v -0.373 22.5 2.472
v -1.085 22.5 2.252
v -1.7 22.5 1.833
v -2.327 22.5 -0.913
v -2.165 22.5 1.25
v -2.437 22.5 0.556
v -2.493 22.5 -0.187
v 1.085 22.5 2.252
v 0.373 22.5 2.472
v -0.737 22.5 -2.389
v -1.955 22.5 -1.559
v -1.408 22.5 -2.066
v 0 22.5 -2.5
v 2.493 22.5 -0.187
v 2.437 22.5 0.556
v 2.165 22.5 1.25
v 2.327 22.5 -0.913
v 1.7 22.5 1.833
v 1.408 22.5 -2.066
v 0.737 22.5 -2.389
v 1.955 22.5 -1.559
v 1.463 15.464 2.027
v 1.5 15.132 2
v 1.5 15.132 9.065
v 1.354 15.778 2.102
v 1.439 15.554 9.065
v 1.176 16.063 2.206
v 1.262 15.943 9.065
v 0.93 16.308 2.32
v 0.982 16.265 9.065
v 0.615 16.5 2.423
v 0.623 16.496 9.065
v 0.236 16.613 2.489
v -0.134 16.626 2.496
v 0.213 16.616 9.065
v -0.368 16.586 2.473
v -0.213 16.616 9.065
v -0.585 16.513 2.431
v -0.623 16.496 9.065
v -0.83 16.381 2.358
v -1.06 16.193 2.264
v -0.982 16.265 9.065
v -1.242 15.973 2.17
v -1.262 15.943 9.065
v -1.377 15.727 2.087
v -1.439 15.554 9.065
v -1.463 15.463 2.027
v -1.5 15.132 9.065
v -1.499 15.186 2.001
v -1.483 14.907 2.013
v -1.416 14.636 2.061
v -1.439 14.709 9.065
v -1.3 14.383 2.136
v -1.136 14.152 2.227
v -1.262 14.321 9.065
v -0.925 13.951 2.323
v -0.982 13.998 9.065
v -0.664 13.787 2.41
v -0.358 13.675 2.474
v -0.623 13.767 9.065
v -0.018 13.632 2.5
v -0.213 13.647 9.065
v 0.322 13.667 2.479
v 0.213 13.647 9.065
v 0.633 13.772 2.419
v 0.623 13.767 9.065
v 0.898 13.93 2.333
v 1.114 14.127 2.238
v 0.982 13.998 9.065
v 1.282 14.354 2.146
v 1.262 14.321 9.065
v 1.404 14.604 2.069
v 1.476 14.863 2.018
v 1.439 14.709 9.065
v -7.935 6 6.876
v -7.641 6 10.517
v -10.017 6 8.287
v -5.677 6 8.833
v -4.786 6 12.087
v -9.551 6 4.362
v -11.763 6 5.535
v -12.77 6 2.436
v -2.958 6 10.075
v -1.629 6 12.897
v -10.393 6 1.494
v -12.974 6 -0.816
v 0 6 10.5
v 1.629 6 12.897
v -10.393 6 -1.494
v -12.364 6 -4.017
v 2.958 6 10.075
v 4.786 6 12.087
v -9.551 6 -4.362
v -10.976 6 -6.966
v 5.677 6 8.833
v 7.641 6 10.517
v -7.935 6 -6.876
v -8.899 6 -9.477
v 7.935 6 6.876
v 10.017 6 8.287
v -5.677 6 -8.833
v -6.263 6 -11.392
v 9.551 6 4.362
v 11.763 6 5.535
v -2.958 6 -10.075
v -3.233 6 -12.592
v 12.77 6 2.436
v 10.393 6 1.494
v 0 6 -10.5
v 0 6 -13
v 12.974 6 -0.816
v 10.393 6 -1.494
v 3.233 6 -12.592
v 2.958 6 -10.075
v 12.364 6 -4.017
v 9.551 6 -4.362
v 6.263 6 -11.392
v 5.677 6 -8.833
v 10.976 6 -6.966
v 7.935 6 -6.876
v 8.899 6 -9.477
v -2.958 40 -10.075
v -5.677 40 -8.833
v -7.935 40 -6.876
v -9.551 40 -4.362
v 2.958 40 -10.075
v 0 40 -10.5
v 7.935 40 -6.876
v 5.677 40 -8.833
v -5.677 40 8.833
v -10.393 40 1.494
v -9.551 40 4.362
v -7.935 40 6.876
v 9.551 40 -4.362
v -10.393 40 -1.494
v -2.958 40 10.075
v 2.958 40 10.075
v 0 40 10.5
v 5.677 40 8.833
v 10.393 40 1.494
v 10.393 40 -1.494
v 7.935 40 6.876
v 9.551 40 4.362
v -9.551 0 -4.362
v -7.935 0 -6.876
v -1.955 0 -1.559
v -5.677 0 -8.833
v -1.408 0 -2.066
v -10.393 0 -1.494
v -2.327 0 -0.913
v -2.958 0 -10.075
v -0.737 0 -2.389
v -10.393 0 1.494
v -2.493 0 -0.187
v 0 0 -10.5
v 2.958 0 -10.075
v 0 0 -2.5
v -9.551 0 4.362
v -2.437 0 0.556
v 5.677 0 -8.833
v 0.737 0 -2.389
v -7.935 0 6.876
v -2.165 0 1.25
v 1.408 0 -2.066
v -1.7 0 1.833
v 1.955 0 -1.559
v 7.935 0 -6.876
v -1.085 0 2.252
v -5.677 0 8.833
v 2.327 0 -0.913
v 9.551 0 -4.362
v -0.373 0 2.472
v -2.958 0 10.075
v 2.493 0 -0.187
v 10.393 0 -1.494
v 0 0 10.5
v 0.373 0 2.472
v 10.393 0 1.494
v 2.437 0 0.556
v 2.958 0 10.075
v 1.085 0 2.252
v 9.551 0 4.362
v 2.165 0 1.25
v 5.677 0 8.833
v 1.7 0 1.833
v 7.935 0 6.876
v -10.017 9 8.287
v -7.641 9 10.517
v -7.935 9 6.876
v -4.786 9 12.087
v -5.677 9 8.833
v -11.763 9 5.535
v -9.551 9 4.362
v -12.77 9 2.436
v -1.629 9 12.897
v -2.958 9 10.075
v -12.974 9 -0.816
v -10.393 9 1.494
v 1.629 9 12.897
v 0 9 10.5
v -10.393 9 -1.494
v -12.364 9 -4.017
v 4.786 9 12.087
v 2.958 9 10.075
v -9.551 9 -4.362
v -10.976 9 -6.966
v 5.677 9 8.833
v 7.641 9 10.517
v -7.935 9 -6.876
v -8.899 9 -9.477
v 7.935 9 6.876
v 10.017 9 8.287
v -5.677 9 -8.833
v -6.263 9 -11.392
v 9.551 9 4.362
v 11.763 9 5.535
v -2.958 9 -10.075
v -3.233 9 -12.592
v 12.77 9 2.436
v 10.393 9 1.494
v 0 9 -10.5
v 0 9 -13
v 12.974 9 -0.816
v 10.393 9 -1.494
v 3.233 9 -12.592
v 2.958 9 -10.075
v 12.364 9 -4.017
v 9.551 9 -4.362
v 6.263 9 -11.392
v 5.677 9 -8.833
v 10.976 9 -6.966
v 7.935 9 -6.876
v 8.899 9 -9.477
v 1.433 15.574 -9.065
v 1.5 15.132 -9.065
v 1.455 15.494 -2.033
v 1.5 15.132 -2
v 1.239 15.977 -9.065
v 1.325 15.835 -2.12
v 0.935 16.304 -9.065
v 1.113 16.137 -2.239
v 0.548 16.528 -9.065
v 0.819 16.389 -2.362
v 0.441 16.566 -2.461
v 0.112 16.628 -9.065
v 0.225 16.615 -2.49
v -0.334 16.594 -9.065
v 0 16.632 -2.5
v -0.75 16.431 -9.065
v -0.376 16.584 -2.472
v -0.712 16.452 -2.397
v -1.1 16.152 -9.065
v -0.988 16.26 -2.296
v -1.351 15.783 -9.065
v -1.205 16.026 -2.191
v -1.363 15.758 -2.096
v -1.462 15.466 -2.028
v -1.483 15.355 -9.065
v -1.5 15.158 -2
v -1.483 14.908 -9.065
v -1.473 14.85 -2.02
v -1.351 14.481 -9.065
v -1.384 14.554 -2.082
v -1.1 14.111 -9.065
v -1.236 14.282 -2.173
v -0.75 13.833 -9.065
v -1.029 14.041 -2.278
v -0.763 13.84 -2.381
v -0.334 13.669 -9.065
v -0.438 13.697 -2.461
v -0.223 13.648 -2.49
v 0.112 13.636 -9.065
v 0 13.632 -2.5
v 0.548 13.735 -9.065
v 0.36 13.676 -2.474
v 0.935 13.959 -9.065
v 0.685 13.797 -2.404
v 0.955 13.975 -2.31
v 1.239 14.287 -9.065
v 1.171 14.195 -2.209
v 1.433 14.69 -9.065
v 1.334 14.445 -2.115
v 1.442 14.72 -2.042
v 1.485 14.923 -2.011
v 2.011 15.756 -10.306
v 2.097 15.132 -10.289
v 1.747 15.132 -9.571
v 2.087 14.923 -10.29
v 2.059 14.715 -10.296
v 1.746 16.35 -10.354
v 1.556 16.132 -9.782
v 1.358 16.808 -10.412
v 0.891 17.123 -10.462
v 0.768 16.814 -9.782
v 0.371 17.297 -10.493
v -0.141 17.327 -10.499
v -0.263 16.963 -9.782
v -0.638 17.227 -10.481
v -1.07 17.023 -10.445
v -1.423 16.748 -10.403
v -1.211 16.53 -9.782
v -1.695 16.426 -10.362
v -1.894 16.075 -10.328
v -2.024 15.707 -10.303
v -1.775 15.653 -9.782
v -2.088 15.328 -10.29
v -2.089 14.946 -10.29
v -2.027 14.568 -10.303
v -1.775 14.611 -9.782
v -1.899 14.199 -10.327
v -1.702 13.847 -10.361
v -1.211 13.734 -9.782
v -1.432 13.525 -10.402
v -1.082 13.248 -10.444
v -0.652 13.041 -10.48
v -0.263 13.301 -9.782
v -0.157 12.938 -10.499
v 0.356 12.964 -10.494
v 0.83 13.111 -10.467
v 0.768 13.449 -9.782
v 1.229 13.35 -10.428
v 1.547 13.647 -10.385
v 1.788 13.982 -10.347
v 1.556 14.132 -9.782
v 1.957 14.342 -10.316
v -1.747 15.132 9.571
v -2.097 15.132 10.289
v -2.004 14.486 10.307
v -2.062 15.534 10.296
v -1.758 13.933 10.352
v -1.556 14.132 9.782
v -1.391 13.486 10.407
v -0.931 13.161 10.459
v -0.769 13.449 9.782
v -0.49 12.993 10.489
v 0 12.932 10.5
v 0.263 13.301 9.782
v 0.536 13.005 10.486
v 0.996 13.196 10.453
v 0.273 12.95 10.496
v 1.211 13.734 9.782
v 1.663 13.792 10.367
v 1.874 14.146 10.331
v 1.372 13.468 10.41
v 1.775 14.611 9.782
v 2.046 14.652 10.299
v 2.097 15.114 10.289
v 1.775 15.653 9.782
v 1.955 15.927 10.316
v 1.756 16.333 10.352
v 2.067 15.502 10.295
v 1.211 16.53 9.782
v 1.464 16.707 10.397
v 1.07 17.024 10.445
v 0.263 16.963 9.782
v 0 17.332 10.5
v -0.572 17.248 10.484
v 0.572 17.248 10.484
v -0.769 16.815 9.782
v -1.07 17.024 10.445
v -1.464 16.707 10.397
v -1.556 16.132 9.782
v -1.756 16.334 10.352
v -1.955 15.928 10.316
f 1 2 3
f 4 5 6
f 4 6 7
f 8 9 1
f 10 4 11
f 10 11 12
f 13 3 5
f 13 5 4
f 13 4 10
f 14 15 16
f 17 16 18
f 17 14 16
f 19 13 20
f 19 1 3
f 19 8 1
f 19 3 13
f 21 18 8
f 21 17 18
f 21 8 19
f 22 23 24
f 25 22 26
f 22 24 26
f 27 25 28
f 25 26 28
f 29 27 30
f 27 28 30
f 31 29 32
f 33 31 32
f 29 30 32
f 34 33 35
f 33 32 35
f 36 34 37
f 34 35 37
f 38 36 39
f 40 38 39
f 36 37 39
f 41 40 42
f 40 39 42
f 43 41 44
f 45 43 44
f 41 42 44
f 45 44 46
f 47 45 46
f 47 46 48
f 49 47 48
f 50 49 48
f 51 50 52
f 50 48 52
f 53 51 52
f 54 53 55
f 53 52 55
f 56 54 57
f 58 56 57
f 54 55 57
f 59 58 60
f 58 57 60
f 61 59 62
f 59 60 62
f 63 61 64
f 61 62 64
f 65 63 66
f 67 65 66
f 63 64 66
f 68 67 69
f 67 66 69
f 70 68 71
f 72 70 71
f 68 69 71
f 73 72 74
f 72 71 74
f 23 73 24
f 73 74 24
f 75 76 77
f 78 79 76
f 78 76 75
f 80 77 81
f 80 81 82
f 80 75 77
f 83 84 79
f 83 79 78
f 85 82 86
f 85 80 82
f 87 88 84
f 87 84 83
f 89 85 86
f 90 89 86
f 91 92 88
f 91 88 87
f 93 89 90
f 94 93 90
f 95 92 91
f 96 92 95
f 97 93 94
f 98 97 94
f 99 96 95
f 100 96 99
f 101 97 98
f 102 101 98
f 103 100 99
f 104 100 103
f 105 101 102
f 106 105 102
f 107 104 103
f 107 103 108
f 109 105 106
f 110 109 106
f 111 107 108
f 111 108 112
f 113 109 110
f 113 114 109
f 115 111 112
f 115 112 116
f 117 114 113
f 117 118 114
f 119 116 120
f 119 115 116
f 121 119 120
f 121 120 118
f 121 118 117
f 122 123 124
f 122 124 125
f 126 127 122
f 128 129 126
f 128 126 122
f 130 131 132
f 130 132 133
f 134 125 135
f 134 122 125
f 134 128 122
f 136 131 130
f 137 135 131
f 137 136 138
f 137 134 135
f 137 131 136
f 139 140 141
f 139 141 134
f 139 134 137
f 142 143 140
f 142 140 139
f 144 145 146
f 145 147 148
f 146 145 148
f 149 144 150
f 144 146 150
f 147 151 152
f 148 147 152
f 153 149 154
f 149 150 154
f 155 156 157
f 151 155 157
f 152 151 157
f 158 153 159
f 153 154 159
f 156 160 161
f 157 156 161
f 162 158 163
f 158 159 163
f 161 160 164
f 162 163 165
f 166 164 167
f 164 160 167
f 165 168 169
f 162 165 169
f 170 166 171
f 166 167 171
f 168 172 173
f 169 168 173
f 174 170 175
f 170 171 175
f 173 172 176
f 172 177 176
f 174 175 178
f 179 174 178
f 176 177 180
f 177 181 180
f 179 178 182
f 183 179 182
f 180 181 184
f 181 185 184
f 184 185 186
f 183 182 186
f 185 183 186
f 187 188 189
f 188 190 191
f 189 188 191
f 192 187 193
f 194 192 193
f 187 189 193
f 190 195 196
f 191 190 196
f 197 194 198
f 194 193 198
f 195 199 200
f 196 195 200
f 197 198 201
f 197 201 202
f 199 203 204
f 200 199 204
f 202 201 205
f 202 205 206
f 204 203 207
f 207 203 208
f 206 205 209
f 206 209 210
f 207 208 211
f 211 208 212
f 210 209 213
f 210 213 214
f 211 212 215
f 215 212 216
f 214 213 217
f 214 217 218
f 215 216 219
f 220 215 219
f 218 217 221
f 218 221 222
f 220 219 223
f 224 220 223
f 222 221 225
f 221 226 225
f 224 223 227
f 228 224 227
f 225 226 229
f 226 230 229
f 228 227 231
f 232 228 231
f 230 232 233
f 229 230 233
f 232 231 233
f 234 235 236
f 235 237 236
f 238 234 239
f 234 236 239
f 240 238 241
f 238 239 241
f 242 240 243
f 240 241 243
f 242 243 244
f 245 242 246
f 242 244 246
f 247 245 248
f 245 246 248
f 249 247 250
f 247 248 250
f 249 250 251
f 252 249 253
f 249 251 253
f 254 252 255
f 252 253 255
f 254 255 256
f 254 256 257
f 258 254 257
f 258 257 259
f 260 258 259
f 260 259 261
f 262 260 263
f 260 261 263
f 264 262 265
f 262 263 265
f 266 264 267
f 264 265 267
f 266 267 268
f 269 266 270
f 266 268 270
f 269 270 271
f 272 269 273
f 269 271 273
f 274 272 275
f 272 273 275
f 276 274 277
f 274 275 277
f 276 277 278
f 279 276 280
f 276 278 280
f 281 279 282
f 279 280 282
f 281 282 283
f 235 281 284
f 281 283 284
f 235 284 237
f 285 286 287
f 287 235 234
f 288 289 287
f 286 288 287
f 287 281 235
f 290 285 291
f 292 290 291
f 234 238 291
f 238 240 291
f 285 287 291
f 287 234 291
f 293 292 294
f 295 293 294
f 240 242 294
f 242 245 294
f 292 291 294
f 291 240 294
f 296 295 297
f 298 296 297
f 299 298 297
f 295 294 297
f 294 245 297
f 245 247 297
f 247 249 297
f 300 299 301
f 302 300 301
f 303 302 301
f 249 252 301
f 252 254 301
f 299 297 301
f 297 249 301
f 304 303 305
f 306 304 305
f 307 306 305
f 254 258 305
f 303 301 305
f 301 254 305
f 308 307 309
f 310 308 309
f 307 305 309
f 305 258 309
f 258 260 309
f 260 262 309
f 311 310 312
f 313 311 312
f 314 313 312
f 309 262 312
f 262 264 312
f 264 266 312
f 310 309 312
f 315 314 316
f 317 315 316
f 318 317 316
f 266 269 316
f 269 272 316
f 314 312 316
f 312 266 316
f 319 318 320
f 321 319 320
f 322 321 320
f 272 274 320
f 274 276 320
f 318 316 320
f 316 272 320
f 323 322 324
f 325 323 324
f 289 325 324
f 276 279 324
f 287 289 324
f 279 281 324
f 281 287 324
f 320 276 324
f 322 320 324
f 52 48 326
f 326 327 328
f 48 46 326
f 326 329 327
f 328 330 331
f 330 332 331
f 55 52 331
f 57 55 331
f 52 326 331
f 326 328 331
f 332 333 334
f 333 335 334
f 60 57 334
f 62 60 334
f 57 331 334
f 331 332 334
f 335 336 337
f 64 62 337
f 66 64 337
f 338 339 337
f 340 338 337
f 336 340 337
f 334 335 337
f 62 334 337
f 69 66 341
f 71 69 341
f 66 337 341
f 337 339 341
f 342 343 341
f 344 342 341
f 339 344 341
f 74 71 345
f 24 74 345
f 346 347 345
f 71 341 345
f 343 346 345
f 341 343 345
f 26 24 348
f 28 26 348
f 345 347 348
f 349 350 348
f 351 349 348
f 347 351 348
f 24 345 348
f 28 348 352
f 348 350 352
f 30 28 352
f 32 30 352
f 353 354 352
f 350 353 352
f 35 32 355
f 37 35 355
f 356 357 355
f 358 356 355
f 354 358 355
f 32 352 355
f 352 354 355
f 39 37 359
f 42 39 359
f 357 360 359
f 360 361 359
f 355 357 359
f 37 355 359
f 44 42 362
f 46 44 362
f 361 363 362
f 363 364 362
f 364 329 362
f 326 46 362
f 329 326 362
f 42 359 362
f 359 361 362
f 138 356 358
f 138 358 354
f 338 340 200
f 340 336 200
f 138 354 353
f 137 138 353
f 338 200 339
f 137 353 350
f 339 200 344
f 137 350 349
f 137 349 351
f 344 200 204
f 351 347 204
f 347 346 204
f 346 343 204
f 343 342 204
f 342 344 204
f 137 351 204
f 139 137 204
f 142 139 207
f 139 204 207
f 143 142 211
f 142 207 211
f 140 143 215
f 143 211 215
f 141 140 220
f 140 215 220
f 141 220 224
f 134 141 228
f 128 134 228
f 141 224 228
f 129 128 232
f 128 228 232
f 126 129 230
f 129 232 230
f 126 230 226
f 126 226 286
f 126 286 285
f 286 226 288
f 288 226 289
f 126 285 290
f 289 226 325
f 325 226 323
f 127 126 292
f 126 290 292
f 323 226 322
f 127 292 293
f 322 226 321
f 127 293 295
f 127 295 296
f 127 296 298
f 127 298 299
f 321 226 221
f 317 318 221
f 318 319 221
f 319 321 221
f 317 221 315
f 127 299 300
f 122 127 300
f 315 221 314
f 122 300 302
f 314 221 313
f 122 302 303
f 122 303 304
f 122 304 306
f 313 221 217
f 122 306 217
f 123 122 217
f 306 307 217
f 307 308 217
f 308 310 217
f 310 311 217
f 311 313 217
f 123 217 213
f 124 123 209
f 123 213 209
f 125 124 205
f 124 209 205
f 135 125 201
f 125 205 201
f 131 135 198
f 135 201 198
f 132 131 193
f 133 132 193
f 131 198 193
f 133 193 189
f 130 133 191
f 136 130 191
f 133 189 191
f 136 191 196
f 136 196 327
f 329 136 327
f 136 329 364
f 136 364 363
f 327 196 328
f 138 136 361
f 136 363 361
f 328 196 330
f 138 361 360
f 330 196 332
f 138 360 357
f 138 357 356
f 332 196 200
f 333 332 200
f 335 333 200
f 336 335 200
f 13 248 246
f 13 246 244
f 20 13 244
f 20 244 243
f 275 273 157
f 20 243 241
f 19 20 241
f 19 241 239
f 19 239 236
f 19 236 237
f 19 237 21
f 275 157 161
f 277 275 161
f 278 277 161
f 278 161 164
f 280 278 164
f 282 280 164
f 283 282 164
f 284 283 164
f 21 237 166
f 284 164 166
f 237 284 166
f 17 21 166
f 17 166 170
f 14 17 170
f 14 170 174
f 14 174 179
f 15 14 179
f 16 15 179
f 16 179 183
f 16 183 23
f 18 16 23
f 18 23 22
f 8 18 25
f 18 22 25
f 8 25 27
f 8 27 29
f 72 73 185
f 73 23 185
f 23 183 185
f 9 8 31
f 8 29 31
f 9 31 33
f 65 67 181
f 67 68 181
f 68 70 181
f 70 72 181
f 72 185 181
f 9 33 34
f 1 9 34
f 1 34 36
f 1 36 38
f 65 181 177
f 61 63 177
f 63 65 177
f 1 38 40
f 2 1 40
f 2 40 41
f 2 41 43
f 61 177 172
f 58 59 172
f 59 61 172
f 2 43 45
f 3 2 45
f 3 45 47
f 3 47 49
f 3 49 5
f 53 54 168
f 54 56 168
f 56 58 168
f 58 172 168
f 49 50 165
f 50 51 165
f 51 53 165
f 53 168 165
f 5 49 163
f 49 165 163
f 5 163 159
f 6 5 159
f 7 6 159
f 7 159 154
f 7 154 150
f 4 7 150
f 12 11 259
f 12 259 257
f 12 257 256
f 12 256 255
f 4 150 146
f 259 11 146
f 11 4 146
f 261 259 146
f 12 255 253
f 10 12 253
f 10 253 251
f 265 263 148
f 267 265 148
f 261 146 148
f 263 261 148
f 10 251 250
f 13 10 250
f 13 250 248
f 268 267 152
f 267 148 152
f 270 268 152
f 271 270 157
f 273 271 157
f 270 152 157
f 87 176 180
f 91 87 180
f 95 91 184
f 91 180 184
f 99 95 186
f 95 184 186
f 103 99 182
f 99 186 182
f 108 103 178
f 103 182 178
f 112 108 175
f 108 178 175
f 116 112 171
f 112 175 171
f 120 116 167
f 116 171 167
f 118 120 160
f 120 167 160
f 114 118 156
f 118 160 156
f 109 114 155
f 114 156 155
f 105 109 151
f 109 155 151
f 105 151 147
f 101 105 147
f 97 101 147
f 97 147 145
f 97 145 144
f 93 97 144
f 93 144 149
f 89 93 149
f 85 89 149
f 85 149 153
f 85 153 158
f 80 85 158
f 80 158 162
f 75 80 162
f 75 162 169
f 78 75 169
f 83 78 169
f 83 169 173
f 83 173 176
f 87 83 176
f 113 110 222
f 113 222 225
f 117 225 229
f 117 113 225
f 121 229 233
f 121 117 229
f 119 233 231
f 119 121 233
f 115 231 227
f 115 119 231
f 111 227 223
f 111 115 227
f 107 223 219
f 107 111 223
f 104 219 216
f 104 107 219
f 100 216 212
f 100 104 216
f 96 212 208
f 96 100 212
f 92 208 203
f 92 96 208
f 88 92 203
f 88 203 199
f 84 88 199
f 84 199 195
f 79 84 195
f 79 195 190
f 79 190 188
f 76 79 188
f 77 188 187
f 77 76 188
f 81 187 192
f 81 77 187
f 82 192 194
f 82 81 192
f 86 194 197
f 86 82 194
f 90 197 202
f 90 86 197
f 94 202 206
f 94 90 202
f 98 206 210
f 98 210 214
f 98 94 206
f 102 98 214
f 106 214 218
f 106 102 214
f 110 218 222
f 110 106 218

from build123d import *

# Parameters (mm, degrees)
SKETCH1_R          = 10.5
EXTRUDE1_DEPTH     = 40
SKETCH2_R          = 2.5
EXTRUDE2_DEPTH     = 22.5
SKETCH3_R          = 13
SKETCH3_R_2        = 10.5
EXTRUDE3_DEPTH     = 3
SKETCH4_R          = 1.5
CUT_EXTRUDE1_DEPTH = 14
SKETCH7_R          = 2.2
CUT_EXTRUDE2_DEPTH = 1.5
CUT_EXTRUDE2_DRAFT = -26
SKETCH8_R          = 2.2
CUT_EXTRUDE3_DEPTH = 1.5
CUT_EXTRUDE3_TAPER = 26


with BuildPart() as part:
    # Sketch1 → Extrude1 (new body)
    with BuildSketch(Plane(origin=(0, 0, 0), x_dir=(1, 0, 0), z_dir=(0, 1, 0))):
        with Locations(Location((0, 0, 0), (0, 0, 270))):
            Circle(SKETCH1_R)
    extrude(amount=EXTRUDE1_DEPTH)

    # Sketch2 → Extrude2 (cut)
    with BuildSketch(Plane.XZ):
        with Locations(Location((0, 0, 0), (0, 0, 270))):
            Circle(SKETCH2_R)
    extrude(amount=-EXTRUDE2_DEPTH, mode=Mode.SUBTRACT)

    # Sketch3 → Extrude3 (add)
    with BuildSketch(Plane.XZ.offset(-6)):
        with Locations(Location((0, 0, 0), (0, 0, 270))):
            Circle(SKETCH3_R)
        with Locations(Location((0, 0, 0), (0, 0, 270))):
            Circle(SKETCH3_R_2, mode=Mode.SUBTRACT)
    extrude(amount=-EXTRUDE3_DEPTH)

    # Sketch4 → Cut-Extrude1 (cut, symmetric)
    with BuildSketch(Plane.XY):
        with Locations((0, 15.131749204)):
            Circle(SKETCH4_R)
    extrude(amount=CUT_EXTRUDE1_DEPTH, both=True, mode=Mode.SUBTRACT)


with BuildPart() as cut_extrude2_tool:
    # Sketch7 → Cut-Extrude2 (with draft: the straight prism first)
    with BuildSketch(Plane(origin=(0, 24.5, 10.5), x_dir=(-1, 0, 0), z_dir=(0, 0, 1))):
        with Locations((0, 9.368250796)):
            Circle(SKETCH7_R)
    extrude(amount=-CUT_EXTRUDE2_DEPTH)
    # Cut-Extrude2: the draft: its side faces are tilted about the plane it starts from
    cut_extrude2_sides = [cut_extrude2_tool.faces().sort_by_distance(p)[0] for p in [
        (2.2, 15.131749204, 9.75),
    ]]
    draft(cut_extrude2_sides, Plane(origin=(0, 24.5, 10.5), x_dir=(-1, 0, 0), z_dir=(0, 0, 1)), CUT_EXTRUDE2_DRAFT)


with BuildPart() as part_1:
    add(part.part)

    # Cut-Extrude2: cut by cut_extrude2_tool
    add(cut_extrude2_tool.part, mode=Mode.SUBTRACT)

    # Sketch8 → Cut-Extrude3 (cut)
    with BuildSketch(Plane.XY.offset(-10.5)):
        with Locations((0, 15.131749204)):
            Circle(SKETCH8_R)
    extrude(amount=CUT_EXTRUDE3_DEPTH, taper=CUT_EXTRUDE3_TAPER, mode=Mode.SUBTRACT)


solid = part_1.part
